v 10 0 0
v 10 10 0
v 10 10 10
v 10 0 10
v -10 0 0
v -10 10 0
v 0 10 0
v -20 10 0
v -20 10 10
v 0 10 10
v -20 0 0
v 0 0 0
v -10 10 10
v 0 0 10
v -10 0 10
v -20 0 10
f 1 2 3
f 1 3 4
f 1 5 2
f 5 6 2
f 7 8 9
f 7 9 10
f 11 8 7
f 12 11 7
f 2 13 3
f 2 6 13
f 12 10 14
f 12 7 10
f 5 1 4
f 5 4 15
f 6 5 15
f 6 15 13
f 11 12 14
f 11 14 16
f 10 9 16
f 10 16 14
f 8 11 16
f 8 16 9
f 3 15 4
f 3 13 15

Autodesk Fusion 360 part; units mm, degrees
sketch "Sketch1" plane through (0, 0, 0) normal (0, 0, 1) x (1, 0, 0)
  line L0 (0, 0) -> (-20, 0)
  line L1 (-20, 0) -> (-20, 10)
  line L2 (-20, 10) -> (0, 10)
  line L3 (0, 10) -> (0, 0)
extrude "Extrude1" add sketch "Sketch1" along normal blind 10 makes body 1
sketch "Sketch1 (2)" plane through (0, 0, 0) normal (0, 0, 1) x (1, 0, 0) in component "Tool"
  line L0 (-10, 10) -> (10, 10)
  line L1 (10, 10) -> (10, 0)
  line L2 (10, 0) -> (-10, 0)
  line L3 (-10, 0) -> (-10, 10)
extrude "Extrude1'" add sketch "Sketch1 (2)" along normal blind 10 separate body makes body 2 in component "Tool"
component "Tool" placed x (1, 0, 0) y (0, 1, 0) z (0, 0, 1) at (0, 0, 0)
